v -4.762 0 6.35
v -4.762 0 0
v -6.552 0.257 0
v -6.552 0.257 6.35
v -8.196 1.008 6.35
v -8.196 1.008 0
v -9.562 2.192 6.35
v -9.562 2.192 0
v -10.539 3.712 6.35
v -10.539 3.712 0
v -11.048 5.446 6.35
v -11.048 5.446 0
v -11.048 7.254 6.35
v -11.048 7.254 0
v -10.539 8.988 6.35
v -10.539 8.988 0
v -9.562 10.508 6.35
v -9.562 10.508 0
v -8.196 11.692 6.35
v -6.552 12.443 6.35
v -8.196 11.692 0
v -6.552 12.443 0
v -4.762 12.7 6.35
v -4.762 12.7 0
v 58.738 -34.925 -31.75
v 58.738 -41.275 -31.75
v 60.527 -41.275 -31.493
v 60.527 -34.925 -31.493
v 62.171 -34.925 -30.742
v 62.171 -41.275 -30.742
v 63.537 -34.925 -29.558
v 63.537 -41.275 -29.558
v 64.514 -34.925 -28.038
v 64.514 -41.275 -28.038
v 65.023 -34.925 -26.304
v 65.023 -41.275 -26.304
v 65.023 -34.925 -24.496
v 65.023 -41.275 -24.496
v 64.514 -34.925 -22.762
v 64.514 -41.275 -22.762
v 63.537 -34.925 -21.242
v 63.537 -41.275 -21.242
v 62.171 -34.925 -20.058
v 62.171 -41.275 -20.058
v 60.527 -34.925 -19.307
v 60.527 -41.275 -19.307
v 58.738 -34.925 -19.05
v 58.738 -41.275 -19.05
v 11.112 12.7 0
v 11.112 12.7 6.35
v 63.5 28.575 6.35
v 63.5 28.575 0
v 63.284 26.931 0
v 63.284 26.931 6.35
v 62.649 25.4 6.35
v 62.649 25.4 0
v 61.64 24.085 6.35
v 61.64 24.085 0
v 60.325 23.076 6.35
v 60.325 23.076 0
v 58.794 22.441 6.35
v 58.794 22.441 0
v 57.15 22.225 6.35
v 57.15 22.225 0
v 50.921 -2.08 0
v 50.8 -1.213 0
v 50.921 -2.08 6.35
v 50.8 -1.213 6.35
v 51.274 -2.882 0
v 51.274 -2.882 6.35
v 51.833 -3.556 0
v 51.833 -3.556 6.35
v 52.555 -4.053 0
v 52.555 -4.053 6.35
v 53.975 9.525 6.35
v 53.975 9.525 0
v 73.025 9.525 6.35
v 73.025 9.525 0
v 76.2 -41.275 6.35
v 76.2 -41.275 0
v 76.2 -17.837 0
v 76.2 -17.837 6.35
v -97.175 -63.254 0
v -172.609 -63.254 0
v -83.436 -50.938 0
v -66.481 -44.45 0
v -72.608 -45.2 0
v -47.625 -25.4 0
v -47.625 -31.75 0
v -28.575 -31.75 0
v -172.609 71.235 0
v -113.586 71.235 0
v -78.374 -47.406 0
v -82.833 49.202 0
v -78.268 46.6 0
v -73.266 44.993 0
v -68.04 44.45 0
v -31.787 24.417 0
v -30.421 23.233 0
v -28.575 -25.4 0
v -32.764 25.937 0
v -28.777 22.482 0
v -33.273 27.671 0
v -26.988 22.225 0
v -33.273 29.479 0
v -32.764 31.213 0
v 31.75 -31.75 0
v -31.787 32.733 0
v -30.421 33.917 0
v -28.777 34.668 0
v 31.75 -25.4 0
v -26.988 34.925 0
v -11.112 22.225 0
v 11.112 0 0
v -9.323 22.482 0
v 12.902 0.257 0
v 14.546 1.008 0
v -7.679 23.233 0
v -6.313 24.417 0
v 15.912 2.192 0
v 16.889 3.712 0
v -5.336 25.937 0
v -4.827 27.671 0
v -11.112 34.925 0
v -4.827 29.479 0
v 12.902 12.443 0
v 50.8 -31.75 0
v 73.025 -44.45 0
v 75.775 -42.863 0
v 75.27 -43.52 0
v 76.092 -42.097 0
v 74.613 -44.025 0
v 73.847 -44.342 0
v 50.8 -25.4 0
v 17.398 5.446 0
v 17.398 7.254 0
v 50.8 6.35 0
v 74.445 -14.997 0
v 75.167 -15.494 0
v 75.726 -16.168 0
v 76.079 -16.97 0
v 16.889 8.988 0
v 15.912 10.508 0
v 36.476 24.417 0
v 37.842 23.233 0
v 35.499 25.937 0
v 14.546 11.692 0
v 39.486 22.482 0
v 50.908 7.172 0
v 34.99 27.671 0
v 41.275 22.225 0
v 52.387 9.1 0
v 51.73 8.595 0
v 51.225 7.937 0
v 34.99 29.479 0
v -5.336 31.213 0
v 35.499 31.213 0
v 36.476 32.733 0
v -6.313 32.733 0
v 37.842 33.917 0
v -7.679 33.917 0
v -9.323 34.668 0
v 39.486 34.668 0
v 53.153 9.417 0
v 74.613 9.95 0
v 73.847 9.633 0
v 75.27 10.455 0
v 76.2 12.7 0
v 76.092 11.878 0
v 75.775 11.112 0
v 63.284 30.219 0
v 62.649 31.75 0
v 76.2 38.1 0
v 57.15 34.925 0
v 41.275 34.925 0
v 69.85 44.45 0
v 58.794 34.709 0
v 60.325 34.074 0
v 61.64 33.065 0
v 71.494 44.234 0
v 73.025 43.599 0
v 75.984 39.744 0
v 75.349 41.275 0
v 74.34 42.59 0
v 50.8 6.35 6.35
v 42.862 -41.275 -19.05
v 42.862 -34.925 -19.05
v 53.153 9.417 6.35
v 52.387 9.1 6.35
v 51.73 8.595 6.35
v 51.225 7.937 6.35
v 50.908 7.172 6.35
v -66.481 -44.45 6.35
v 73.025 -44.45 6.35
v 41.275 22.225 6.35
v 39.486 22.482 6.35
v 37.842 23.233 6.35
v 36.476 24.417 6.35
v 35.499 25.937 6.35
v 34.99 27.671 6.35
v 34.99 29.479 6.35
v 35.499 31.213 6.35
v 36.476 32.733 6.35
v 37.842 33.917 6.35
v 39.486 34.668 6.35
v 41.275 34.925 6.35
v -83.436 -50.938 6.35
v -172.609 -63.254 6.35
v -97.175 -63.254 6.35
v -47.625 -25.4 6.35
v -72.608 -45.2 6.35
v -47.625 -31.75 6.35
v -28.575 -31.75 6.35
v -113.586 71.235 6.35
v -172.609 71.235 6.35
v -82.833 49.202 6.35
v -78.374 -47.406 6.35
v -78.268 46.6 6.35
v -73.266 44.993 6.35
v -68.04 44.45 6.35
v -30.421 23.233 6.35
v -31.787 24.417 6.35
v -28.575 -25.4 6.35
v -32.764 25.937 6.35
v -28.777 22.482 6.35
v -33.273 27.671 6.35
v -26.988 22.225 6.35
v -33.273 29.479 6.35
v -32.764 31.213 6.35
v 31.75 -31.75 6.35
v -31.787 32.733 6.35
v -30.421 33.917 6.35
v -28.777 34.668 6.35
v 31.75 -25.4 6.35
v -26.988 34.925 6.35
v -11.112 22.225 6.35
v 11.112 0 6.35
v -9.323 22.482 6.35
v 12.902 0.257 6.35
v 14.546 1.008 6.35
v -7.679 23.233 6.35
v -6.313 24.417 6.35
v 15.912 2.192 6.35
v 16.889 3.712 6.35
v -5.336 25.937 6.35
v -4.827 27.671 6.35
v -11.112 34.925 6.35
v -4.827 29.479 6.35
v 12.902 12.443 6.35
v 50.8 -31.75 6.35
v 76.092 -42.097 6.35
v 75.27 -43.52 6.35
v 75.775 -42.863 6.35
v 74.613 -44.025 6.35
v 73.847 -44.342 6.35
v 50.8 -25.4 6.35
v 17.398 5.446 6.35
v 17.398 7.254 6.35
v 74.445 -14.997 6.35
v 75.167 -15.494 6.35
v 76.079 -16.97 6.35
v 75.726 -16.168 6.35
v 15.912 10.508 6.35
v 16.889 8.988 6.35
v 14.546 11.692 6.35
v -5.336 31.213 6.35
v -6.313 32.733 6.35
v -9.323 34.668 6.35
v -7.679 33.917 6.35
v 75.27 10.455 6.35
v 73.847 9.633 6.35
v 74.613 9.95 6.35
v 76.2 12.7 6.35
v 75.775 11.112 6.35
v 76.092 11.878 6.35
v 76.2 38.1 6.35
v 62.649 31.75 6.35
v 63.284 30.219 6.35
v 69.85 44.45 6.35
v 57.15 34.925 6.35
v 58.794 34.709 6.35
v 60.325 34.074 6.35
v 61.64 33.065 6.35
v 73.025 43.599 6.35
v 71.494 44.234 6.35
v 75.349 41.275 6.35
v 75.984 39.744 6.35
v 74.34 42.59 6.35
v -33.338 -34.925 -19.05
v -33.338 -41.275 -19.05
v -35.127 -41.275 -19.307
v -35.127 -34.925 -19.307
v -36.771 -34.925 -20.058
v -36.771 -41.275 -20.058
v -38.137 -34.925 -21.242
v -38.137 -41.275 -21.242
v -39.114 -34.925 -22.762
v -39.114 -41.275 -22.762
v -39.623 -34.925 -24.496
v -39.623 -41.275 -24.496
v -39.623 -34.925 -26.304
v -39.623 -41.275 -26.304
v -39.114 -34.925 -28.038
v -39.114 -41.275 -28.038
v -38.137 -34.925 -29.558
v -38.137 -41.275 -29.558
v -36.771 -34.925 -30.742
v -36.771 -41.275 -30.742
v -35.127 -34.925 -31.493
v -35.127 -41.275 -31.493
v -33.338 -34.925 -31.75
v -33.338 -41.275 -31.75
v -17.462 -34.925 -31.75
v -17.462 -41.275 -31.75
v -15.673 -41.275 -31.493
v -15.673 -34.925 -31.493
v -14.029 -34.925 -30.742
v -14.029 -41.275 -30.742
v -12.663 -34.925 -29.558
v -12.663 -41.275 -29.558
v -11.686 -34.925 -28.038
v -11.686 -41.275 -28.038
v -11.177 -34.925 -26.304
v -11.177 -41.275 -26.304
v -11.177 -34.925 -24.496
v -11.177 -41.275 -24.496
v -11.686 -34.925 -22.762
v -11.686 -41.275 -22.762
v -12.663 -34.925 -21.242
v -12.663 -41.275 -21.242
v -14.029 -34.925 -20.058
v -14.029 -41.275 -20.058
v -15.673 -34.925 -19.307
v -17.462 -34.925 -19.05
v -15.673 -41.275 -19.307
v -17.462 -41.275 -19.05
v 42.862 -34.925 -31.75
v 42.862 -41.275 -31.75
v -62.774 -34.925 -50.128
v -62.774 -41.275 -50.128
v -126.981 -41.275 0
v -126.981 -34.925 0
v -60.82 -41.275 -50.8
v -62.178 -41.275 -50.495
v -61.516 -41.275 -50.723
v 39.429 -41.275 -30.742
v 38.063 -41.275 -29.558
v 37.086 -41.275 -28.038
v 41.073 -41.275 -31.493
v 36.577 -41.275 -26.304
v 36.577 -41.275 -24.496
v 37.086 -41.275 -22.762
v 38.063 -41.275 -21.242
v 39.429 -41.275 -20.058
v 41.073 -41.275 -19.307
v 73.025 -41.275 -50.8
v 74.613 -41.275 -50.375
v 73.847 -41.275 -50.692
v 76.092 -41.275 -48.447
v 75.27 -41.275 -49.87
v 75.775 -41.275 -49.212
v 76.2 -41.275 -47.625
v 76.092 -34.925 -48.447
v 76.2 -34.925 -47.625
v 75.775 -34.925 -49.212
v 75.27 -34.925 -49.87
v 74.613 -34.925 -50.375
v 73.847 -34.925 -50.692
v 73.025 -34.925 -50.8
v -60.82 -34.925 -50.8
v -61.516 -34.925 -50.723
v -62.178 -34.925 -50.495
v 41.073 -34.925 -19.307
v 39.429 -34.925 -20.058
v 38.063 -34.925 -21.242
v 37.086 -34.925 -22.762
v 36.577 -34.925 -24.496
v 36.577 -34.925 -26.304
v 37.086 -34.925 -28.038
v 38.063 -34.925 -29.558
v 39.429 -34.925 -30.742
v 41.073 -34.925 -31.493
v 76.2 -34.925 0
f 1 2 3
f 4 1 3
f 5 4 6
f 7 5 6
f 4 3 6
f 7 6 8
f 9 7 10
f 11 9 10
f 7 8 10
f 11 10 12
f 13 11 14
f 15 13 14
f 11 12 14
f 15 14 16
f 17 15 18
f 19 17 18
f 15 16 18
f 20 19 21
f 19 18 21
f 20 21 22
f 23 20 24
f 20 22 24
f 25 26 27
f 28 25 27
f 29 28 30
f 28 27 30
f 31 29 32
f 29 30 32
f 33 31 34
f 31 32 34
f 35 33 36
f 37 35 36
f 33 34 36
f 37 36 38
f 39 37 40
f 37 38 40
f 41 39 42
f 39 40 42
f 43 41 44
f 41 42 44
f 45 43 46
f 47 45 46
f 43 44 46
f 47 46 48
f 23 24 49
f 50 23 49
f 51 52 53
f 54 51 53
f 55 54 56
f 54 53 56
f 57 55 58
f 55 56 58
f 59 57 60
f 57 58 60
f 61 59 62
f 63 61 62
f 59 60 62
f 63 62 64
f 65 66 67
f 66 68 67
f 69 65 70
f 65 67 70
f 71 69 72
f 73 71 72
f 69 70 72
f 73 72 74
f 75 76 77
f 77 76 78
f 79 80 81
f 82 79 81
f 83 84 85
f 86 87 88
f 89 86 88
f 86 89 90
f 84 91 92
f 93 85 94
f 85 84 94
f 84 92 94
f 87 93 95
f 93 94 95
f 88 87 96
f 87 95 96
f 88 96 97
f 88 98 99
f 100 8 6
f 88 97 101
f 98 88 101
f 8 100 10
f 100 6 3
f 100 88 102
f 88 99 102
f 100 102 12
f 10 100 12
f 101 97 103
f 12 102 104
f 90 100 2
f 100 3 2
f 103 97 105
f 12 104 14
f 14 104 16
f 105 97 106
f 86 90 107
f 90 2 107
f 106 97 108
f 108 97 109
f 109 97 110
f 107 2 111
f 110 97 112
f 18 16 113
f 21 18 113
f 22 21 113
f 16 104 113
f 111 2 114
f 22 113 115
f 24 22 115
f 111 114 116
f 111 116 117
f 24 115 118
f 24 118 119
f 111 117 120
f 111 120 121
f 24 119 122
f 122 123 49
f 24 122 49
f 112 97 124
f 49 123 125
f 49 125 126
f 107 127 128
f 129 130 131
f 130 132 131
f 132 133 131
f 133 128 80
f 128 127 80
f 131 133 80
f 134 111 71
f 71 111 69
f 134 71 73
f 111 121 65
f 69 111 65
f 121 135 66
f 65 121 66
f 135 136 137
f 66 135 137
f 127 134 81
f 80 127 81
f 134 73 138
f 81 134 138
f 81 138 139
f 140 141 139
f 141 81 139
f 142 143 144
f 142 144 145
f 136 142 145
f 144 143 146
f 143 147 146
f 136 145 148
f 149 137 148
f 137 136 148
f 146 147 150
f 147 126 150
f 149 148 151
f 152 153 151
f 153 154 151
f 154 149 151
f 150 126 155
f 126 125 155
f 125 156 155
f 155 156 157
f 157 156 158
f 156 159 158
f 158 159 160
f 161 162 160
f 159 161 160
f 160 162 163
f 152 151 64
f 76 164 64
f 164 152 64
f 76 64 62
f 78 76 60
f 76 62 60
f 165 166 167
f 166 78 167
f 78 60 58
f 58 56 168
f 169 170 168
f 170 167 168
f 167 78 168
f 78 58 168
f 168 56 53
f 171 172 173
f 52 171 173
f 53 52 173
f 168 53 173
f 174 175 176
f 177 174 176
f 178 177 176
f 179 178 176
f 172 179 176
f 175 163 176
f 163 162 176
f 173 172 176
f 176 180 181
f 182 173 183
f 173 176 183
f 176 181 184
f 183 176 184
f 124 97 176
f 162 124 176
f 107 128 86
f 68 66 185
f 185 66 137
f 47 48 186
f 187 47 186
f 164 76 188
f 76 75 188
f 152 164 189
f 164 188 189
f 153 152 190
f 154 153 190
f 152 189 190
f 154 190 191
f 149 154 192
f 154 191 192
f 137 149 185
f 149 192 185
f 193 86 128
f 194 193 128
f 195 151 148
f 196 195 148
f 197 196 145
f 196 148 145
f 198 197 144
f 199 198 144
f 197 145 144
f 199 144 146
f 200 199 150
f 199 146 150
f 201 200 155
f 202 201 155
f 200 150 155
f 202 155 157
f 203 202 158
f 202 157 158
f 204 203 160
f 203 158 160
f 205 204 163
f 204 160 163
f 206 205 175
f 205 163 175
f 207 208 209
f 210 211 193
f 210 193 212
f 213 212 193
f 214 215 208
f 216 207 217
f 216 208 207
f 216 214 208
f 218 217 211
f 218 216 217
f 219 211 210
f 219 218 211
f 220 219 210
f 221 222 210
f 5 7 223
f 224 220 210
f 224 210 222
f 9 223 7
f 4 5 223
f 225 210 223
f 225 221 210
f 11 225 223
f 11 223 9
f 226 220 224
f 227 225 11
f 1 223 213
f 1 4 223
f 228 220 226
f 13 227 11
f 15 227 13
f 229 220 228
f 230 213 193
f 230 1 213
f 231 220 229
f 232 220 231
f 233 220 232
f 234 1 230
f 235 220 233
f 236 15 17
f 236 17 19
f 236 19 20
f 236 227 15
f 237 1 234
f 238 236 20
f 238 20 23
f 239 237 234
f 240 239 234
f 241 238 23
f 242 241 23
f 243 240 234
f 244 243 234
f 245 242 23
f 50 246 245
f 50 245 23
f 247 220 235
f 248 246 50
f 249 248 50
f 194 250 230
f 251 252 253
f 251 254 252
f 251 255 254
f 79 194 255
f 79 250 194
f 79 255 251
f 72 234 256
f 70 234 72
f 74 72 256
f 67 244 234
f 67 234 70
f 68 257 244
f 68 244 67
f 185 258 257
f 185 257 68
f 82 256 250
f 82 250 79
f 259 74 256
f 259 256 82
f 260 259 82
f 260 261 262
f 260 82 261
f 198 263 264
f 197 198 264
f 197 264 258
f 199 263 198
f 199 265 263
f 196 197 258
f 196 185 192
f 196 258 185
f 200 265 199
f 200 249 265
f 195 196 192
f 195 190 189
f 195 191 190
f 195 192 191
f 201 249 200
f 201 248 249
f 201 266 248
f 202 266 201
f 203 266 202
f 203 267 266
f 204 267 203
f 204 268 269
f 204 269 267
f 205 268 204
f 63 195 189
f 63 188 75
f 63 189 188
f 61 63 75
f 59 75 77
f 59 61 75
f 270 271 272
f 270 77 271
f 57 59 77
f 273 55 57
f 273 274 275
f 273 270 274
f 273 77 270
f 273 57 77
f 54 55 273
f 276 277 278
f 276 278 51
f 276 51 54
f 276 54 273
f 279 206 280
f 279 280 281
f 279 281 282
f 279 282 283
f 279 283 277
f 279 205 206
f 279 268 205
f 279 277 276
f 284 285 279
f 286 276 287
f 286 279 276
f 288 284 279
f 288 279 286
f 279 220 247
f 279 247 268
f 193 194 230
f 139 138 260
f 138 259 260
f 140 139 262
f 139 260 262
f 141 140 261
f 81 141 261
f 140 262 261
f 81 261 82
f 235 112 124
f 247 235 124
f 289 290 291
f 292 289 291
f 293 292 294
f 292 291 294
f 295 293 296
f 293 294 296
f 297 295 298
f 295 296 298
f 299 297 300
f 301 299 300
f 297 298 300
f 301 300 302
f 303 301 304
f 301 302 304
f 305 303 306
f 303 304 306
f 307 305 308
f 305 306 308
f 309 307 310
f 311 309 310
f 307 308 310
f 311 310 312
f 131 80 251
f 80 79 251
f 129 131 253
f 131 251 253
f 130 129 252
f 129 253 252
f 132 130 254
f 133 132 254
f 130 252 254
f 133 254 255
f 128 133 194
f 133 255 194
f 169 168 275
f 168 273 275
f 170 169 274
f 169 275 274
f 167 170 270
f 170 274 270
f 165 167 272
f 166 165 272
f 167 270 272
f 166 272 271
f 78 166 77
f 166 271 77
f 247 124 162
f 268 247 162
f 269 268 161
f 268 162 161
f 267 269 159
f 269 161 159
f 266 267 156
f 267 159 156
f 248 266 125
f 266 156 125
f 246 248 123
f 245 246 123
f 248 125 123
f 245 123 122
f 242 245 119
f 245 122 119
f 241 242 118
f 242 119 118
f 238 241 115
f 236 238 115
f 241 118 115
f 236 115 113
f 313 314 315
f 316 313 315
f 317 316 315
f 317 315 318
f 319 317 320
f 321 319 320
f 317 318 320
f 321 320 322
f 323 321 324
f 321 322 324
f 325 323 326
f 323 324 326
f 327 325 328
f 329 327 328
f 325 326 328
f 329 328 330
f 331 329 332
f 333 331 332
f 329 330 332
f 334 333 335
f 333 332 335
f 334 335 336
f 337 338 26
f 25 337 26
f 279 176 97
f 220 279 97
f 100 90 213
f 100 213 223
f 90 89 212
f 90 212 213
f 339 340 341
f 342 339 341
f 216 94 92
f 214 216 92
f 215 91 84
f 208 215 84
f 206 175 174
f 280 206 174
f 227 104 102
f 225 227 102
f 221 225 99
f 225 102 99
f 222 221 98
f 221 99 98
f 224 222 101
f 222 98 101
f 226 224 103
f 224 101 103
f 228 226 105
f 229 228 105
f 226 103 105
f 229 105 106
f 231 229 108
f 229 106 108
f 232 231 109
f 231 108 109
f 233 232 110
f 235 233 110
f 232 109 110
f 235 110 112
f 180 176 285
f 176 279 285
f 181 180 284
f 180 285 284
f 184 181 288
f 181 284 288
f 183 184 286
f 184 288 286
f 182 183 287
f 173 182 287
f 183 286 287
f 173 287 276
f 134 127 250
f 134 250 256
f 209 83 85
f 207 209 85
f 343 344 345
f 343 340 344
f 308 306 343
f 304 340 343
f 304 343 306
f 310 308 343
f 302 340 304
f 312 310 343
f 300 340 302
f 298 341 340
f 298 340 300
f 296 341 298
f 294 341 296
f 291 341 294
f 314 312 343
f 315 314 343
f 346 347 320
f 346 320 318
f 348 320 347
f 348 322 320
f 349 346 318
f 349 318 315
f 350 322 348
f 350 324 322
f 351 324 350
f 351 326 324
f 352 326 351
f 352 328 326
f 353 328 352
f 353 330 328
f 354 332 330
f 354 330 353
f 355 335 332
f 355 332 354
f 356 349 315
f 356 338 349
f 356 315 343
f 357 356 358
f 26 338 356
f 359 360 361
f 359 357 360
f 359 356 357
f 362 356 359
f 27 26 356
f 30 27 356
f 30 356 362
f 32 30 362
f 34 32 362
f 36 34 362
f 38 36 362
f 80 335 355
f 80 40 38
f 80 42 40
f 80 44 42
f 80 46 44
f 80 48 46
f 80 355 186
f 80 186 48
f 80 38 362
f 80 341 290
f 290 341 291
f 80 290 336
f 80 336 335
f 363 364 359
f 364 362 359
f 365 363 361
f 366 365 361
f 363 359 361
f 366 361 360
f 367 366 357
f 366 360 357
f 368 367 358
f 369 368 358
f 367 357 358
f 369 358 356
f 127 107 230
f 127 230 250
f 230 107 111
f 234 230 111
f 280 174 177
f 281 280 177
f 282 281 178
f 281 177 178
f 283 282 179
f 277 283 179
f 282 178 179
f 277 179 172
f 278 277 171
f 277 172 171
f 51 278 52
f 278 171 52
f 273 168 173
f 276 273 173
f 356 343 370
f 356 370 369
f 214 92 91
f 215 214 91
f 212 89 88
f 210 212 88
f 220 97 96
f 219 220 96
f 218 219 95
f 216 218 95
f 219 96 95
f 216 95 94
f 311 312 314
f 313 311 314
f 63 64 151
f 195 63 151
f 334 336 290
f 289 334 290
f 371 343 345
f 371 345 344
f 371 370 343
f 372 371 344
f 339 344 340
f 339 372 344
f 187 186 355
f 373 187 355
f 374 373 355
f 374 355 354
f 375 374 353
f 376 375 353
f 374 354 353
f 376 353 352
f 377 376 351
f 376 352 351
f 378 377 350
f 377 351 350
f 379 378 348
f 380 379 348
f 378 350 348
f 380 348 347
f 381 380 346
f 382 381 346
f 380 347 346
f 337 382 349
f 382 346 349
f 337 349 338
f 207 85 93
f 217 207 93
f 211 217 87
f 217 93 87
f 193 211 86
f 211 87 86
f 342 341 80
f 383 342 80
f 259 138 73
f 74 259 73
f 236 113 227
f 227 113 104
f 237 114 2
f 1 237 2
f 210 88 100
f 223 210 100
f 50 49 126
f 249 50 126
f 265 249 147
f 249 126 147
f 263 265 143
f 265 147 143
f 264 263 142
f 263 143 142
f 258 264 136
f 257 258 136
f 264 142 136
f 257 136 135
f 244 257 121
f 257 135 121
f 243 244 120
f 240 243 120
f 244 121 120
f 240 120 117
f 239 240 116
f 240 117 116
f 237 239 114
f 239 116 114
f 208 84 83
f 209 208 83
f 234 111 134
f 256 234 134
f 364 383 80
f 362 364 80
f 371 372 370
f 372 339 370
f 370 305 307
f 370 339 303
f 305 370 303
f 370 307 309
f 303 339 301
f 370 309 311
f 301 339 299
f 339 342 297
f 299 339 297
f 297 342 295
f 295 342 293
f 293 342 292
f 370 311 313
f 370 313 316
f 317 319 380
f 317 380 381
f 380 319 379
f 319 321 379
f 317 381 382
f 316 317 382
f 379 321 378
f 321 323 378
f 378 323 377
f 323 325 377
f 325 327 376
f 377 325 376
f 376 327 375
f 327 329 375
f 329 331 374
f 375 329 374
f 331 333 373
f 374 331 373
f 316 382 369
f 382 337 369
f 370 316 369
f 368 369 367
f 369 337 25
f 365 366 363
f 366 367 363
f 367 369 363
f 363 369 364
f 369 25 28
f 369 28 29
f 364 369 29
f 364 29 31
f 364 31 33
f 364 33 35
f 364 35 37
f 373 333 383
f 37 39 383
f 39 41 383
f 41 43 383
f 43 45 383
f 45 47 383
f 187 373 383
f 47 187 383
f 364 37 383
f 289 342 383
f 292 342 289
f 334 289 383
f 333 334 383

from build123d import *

# Parameters (mm, degrees)
F0_W     = 19.05
F0_H     = 6.35
F1_DEPTH = 6.35
F2_W     = 228.1926768713
F2_H     = 6.35
F3_DEPTH = 50.8
F5_DEPTH = 112.5108414421
F6_R     = 6.35
F7_R     = 3.175
F7_2_R   = 3.175


with BuildPart() as f1:
    # F0 (on Top) → F1 (new body)
    with BuildSketch(Plane.XY):
        with BuildLine():
            Line((76.2, 44.45), (-68.0401977532, 44.45))
            ThreePointArc((-68.0401977532, 44.45), (-75.8089619471, 45.6672312813), (-82.8331290705, 49.2022596142))
            Line((-82.8331290705, 49.2022596142), (-113.5858595371, 71.2348414421))
            Line((-113.5858595371, 71.2348414421), (-172.6087629795, 71.2348414421))
            Line((-172.6087629795, 71.2348414421), (-172.6087629795, -63.2538875401))
            Line((-172.6087629795, -63.2538875401), (-97.1746146679, -63.2538875401))
            Line((-97.1746146679, -63.2538875401), (-83.4364361492, -50.9375152033))
            ThreePointArc((-83.4364361492, -50.9375152033), (-75.5582355761, -46.1272565474), (-66.4812623426, -44.45))
            Line((-66.4812623426, -44.45), (76.2, -44.45))
            Line((76.2, -44.45), (76.2, -15.875))
            Line((76.2, -15.875), (50.8, -3.175))
            Line((50.8, -3.175), (50.8, 9.525))
            Line((50.8, 9.525), (76.2, 9.525))
            Line((76.2, 9.525), (76.2, 44.45))
        make_face()
        with Locations((-38.1, -28.575)):
            Rectangle(F0_W, F0_H, mode=Mode.SUBTRACT)
        with Locations((41.275, -28.575)):
            Rectangle(F0_W, F0_H, mode=Mode.SUBTRACT)
        with BuildLine():
            Line((-4.7625, 12.7), (3.175, 12.7))
            Line((3.175, 12.7), (11.1125, 12.7))
            ThreePointArc((11.1125, 12.7), (17.4625, 6.35), (11.1125, 0))
            Line((11.1125, 0), (3.175, 0))
            Line((3.175, 0), (-4.7625, 0))
            ThreePointArc((-4.7625, 0), (-11.1125, 6.35), (-4.7625, 12.7))
        make_face(mode=Mode.SUBTRACT)
        with BuildLine():
            Line((-26.9875, 34.925), (-19.05, 34.925))
            Line((-19.05, 34.925), (-11.1125, 34.925))
            ThreePointArc((-11.1125, 34.925), (-4.7625, 28.575), (-11.1125, 22.225))
            Line((-11.1125, 22.225), (-19.05, 22.225))
            Line((-19.05, 22.225), (-26.9875, 22.225))
            ThreePointArc((-26.9875, 22.225), (-33.3375, 28.575), (-26.9875, 34.925))
        make_face(mode=Mode.SUBTRACT)
        with BuildLine():
            ThreePointArc((57.15, 34.925), (61.6401280605, 33.0651280605), (63.5, 28.575))
            ThreePointArc((63.5, 28.575), (61.6401280605, 24.0848719395), (57.15, 22.225))
            Line((57.15, 22.225), (41.275, 22.225))
            ThreePointArc((41.275, 22.225), (34.925, 28.575), (41.275, 34.925))
            Line((41.275, 34.925), (57.15, 34.925))
        make_face(mode=Mode.SUBTRACT)
    extrude(amount=F1_DEPTH)

    # F6
    f6_edges = [f1.edges().sort_by_distance(p)[0] for p in [
        (76.2, 44.45, 3.175),
    ]]
    fillet(f6_edges, radius=F6_R)

    # F7
    f7_edges = [f1.edges().sort_by_distance(p)[0] for p in [
        (76.2, 9.525, 3.175),
        (76.2, -15.875, 3.175),
        (50.8, 9.525, 3.175),
        (50.8, -3.175, 3.175),
        (76.2, -44.45, 3.175),
    ]]
    fillet(f7_edges, radius=F7_R)


with BuildPart() as f3:
    # F2 (on face) → F3 (new body)
    with BuildSketch(Plane(origin=(0, 0, 0), x_dir=(1, 0, 0), z_dir=(0, 0, -1))):
        with Locations((-37.8963384356, 38.1)):
            Rectangle(F2_W, F2_H)
    extrude(amount=F3_DEPTH)

    # F4 (on face) → F5 (cut, through all)
    with BuildSketch(Plane.XZ.offset(41.275)):
        with BuildLine():
            ThreePointArc((-33.3375, -19.05), (-39.6875, -25.4), (-33.3375, -31.75))
            Line((-33.3375, -31.75), (-17.4625, -31.75))
            ThreePointArc((-17.4625, -31.75), (-11.1125, -25.4), (-17.4625, -19.05))
            Line((-17.4625, -19.05), (-33.3375, -19.05))
        make_face()
        with BuildLine():
            ThreePointArc((58.7375, -31.75), (65.0875, -25.4), (58.7375, -19.05))
            Line((58.7375, -19.05), (42.8625, -19.05))
            ThreePointArc((42.8625, -19.05), (36.5125, -25.4), (42.8625, -31.75))
            Line((42.8625, -31.75), (58.7375, -31.75))
        make_face()
        Polygon((-61.9125, -50.8), (-126.9806373638, 0), (-151.9926768713, 0), (-151.9926768713, -50.8), align=None)
    extrude(amount=-F5_DEPTH, mode=Mode.SUBTRACT)

    # F7#2
    f7_2_edges = [f3.edges().sort_by_distance(p)[0] for p in [
        (76.2, -38.1, -50.8),
        (-61.9125, -38.1, -50.8),
    ]]
    fillet(f7_2_edges, radius=F7_2_R)


solid = Compound([f1.part, f3.part])
